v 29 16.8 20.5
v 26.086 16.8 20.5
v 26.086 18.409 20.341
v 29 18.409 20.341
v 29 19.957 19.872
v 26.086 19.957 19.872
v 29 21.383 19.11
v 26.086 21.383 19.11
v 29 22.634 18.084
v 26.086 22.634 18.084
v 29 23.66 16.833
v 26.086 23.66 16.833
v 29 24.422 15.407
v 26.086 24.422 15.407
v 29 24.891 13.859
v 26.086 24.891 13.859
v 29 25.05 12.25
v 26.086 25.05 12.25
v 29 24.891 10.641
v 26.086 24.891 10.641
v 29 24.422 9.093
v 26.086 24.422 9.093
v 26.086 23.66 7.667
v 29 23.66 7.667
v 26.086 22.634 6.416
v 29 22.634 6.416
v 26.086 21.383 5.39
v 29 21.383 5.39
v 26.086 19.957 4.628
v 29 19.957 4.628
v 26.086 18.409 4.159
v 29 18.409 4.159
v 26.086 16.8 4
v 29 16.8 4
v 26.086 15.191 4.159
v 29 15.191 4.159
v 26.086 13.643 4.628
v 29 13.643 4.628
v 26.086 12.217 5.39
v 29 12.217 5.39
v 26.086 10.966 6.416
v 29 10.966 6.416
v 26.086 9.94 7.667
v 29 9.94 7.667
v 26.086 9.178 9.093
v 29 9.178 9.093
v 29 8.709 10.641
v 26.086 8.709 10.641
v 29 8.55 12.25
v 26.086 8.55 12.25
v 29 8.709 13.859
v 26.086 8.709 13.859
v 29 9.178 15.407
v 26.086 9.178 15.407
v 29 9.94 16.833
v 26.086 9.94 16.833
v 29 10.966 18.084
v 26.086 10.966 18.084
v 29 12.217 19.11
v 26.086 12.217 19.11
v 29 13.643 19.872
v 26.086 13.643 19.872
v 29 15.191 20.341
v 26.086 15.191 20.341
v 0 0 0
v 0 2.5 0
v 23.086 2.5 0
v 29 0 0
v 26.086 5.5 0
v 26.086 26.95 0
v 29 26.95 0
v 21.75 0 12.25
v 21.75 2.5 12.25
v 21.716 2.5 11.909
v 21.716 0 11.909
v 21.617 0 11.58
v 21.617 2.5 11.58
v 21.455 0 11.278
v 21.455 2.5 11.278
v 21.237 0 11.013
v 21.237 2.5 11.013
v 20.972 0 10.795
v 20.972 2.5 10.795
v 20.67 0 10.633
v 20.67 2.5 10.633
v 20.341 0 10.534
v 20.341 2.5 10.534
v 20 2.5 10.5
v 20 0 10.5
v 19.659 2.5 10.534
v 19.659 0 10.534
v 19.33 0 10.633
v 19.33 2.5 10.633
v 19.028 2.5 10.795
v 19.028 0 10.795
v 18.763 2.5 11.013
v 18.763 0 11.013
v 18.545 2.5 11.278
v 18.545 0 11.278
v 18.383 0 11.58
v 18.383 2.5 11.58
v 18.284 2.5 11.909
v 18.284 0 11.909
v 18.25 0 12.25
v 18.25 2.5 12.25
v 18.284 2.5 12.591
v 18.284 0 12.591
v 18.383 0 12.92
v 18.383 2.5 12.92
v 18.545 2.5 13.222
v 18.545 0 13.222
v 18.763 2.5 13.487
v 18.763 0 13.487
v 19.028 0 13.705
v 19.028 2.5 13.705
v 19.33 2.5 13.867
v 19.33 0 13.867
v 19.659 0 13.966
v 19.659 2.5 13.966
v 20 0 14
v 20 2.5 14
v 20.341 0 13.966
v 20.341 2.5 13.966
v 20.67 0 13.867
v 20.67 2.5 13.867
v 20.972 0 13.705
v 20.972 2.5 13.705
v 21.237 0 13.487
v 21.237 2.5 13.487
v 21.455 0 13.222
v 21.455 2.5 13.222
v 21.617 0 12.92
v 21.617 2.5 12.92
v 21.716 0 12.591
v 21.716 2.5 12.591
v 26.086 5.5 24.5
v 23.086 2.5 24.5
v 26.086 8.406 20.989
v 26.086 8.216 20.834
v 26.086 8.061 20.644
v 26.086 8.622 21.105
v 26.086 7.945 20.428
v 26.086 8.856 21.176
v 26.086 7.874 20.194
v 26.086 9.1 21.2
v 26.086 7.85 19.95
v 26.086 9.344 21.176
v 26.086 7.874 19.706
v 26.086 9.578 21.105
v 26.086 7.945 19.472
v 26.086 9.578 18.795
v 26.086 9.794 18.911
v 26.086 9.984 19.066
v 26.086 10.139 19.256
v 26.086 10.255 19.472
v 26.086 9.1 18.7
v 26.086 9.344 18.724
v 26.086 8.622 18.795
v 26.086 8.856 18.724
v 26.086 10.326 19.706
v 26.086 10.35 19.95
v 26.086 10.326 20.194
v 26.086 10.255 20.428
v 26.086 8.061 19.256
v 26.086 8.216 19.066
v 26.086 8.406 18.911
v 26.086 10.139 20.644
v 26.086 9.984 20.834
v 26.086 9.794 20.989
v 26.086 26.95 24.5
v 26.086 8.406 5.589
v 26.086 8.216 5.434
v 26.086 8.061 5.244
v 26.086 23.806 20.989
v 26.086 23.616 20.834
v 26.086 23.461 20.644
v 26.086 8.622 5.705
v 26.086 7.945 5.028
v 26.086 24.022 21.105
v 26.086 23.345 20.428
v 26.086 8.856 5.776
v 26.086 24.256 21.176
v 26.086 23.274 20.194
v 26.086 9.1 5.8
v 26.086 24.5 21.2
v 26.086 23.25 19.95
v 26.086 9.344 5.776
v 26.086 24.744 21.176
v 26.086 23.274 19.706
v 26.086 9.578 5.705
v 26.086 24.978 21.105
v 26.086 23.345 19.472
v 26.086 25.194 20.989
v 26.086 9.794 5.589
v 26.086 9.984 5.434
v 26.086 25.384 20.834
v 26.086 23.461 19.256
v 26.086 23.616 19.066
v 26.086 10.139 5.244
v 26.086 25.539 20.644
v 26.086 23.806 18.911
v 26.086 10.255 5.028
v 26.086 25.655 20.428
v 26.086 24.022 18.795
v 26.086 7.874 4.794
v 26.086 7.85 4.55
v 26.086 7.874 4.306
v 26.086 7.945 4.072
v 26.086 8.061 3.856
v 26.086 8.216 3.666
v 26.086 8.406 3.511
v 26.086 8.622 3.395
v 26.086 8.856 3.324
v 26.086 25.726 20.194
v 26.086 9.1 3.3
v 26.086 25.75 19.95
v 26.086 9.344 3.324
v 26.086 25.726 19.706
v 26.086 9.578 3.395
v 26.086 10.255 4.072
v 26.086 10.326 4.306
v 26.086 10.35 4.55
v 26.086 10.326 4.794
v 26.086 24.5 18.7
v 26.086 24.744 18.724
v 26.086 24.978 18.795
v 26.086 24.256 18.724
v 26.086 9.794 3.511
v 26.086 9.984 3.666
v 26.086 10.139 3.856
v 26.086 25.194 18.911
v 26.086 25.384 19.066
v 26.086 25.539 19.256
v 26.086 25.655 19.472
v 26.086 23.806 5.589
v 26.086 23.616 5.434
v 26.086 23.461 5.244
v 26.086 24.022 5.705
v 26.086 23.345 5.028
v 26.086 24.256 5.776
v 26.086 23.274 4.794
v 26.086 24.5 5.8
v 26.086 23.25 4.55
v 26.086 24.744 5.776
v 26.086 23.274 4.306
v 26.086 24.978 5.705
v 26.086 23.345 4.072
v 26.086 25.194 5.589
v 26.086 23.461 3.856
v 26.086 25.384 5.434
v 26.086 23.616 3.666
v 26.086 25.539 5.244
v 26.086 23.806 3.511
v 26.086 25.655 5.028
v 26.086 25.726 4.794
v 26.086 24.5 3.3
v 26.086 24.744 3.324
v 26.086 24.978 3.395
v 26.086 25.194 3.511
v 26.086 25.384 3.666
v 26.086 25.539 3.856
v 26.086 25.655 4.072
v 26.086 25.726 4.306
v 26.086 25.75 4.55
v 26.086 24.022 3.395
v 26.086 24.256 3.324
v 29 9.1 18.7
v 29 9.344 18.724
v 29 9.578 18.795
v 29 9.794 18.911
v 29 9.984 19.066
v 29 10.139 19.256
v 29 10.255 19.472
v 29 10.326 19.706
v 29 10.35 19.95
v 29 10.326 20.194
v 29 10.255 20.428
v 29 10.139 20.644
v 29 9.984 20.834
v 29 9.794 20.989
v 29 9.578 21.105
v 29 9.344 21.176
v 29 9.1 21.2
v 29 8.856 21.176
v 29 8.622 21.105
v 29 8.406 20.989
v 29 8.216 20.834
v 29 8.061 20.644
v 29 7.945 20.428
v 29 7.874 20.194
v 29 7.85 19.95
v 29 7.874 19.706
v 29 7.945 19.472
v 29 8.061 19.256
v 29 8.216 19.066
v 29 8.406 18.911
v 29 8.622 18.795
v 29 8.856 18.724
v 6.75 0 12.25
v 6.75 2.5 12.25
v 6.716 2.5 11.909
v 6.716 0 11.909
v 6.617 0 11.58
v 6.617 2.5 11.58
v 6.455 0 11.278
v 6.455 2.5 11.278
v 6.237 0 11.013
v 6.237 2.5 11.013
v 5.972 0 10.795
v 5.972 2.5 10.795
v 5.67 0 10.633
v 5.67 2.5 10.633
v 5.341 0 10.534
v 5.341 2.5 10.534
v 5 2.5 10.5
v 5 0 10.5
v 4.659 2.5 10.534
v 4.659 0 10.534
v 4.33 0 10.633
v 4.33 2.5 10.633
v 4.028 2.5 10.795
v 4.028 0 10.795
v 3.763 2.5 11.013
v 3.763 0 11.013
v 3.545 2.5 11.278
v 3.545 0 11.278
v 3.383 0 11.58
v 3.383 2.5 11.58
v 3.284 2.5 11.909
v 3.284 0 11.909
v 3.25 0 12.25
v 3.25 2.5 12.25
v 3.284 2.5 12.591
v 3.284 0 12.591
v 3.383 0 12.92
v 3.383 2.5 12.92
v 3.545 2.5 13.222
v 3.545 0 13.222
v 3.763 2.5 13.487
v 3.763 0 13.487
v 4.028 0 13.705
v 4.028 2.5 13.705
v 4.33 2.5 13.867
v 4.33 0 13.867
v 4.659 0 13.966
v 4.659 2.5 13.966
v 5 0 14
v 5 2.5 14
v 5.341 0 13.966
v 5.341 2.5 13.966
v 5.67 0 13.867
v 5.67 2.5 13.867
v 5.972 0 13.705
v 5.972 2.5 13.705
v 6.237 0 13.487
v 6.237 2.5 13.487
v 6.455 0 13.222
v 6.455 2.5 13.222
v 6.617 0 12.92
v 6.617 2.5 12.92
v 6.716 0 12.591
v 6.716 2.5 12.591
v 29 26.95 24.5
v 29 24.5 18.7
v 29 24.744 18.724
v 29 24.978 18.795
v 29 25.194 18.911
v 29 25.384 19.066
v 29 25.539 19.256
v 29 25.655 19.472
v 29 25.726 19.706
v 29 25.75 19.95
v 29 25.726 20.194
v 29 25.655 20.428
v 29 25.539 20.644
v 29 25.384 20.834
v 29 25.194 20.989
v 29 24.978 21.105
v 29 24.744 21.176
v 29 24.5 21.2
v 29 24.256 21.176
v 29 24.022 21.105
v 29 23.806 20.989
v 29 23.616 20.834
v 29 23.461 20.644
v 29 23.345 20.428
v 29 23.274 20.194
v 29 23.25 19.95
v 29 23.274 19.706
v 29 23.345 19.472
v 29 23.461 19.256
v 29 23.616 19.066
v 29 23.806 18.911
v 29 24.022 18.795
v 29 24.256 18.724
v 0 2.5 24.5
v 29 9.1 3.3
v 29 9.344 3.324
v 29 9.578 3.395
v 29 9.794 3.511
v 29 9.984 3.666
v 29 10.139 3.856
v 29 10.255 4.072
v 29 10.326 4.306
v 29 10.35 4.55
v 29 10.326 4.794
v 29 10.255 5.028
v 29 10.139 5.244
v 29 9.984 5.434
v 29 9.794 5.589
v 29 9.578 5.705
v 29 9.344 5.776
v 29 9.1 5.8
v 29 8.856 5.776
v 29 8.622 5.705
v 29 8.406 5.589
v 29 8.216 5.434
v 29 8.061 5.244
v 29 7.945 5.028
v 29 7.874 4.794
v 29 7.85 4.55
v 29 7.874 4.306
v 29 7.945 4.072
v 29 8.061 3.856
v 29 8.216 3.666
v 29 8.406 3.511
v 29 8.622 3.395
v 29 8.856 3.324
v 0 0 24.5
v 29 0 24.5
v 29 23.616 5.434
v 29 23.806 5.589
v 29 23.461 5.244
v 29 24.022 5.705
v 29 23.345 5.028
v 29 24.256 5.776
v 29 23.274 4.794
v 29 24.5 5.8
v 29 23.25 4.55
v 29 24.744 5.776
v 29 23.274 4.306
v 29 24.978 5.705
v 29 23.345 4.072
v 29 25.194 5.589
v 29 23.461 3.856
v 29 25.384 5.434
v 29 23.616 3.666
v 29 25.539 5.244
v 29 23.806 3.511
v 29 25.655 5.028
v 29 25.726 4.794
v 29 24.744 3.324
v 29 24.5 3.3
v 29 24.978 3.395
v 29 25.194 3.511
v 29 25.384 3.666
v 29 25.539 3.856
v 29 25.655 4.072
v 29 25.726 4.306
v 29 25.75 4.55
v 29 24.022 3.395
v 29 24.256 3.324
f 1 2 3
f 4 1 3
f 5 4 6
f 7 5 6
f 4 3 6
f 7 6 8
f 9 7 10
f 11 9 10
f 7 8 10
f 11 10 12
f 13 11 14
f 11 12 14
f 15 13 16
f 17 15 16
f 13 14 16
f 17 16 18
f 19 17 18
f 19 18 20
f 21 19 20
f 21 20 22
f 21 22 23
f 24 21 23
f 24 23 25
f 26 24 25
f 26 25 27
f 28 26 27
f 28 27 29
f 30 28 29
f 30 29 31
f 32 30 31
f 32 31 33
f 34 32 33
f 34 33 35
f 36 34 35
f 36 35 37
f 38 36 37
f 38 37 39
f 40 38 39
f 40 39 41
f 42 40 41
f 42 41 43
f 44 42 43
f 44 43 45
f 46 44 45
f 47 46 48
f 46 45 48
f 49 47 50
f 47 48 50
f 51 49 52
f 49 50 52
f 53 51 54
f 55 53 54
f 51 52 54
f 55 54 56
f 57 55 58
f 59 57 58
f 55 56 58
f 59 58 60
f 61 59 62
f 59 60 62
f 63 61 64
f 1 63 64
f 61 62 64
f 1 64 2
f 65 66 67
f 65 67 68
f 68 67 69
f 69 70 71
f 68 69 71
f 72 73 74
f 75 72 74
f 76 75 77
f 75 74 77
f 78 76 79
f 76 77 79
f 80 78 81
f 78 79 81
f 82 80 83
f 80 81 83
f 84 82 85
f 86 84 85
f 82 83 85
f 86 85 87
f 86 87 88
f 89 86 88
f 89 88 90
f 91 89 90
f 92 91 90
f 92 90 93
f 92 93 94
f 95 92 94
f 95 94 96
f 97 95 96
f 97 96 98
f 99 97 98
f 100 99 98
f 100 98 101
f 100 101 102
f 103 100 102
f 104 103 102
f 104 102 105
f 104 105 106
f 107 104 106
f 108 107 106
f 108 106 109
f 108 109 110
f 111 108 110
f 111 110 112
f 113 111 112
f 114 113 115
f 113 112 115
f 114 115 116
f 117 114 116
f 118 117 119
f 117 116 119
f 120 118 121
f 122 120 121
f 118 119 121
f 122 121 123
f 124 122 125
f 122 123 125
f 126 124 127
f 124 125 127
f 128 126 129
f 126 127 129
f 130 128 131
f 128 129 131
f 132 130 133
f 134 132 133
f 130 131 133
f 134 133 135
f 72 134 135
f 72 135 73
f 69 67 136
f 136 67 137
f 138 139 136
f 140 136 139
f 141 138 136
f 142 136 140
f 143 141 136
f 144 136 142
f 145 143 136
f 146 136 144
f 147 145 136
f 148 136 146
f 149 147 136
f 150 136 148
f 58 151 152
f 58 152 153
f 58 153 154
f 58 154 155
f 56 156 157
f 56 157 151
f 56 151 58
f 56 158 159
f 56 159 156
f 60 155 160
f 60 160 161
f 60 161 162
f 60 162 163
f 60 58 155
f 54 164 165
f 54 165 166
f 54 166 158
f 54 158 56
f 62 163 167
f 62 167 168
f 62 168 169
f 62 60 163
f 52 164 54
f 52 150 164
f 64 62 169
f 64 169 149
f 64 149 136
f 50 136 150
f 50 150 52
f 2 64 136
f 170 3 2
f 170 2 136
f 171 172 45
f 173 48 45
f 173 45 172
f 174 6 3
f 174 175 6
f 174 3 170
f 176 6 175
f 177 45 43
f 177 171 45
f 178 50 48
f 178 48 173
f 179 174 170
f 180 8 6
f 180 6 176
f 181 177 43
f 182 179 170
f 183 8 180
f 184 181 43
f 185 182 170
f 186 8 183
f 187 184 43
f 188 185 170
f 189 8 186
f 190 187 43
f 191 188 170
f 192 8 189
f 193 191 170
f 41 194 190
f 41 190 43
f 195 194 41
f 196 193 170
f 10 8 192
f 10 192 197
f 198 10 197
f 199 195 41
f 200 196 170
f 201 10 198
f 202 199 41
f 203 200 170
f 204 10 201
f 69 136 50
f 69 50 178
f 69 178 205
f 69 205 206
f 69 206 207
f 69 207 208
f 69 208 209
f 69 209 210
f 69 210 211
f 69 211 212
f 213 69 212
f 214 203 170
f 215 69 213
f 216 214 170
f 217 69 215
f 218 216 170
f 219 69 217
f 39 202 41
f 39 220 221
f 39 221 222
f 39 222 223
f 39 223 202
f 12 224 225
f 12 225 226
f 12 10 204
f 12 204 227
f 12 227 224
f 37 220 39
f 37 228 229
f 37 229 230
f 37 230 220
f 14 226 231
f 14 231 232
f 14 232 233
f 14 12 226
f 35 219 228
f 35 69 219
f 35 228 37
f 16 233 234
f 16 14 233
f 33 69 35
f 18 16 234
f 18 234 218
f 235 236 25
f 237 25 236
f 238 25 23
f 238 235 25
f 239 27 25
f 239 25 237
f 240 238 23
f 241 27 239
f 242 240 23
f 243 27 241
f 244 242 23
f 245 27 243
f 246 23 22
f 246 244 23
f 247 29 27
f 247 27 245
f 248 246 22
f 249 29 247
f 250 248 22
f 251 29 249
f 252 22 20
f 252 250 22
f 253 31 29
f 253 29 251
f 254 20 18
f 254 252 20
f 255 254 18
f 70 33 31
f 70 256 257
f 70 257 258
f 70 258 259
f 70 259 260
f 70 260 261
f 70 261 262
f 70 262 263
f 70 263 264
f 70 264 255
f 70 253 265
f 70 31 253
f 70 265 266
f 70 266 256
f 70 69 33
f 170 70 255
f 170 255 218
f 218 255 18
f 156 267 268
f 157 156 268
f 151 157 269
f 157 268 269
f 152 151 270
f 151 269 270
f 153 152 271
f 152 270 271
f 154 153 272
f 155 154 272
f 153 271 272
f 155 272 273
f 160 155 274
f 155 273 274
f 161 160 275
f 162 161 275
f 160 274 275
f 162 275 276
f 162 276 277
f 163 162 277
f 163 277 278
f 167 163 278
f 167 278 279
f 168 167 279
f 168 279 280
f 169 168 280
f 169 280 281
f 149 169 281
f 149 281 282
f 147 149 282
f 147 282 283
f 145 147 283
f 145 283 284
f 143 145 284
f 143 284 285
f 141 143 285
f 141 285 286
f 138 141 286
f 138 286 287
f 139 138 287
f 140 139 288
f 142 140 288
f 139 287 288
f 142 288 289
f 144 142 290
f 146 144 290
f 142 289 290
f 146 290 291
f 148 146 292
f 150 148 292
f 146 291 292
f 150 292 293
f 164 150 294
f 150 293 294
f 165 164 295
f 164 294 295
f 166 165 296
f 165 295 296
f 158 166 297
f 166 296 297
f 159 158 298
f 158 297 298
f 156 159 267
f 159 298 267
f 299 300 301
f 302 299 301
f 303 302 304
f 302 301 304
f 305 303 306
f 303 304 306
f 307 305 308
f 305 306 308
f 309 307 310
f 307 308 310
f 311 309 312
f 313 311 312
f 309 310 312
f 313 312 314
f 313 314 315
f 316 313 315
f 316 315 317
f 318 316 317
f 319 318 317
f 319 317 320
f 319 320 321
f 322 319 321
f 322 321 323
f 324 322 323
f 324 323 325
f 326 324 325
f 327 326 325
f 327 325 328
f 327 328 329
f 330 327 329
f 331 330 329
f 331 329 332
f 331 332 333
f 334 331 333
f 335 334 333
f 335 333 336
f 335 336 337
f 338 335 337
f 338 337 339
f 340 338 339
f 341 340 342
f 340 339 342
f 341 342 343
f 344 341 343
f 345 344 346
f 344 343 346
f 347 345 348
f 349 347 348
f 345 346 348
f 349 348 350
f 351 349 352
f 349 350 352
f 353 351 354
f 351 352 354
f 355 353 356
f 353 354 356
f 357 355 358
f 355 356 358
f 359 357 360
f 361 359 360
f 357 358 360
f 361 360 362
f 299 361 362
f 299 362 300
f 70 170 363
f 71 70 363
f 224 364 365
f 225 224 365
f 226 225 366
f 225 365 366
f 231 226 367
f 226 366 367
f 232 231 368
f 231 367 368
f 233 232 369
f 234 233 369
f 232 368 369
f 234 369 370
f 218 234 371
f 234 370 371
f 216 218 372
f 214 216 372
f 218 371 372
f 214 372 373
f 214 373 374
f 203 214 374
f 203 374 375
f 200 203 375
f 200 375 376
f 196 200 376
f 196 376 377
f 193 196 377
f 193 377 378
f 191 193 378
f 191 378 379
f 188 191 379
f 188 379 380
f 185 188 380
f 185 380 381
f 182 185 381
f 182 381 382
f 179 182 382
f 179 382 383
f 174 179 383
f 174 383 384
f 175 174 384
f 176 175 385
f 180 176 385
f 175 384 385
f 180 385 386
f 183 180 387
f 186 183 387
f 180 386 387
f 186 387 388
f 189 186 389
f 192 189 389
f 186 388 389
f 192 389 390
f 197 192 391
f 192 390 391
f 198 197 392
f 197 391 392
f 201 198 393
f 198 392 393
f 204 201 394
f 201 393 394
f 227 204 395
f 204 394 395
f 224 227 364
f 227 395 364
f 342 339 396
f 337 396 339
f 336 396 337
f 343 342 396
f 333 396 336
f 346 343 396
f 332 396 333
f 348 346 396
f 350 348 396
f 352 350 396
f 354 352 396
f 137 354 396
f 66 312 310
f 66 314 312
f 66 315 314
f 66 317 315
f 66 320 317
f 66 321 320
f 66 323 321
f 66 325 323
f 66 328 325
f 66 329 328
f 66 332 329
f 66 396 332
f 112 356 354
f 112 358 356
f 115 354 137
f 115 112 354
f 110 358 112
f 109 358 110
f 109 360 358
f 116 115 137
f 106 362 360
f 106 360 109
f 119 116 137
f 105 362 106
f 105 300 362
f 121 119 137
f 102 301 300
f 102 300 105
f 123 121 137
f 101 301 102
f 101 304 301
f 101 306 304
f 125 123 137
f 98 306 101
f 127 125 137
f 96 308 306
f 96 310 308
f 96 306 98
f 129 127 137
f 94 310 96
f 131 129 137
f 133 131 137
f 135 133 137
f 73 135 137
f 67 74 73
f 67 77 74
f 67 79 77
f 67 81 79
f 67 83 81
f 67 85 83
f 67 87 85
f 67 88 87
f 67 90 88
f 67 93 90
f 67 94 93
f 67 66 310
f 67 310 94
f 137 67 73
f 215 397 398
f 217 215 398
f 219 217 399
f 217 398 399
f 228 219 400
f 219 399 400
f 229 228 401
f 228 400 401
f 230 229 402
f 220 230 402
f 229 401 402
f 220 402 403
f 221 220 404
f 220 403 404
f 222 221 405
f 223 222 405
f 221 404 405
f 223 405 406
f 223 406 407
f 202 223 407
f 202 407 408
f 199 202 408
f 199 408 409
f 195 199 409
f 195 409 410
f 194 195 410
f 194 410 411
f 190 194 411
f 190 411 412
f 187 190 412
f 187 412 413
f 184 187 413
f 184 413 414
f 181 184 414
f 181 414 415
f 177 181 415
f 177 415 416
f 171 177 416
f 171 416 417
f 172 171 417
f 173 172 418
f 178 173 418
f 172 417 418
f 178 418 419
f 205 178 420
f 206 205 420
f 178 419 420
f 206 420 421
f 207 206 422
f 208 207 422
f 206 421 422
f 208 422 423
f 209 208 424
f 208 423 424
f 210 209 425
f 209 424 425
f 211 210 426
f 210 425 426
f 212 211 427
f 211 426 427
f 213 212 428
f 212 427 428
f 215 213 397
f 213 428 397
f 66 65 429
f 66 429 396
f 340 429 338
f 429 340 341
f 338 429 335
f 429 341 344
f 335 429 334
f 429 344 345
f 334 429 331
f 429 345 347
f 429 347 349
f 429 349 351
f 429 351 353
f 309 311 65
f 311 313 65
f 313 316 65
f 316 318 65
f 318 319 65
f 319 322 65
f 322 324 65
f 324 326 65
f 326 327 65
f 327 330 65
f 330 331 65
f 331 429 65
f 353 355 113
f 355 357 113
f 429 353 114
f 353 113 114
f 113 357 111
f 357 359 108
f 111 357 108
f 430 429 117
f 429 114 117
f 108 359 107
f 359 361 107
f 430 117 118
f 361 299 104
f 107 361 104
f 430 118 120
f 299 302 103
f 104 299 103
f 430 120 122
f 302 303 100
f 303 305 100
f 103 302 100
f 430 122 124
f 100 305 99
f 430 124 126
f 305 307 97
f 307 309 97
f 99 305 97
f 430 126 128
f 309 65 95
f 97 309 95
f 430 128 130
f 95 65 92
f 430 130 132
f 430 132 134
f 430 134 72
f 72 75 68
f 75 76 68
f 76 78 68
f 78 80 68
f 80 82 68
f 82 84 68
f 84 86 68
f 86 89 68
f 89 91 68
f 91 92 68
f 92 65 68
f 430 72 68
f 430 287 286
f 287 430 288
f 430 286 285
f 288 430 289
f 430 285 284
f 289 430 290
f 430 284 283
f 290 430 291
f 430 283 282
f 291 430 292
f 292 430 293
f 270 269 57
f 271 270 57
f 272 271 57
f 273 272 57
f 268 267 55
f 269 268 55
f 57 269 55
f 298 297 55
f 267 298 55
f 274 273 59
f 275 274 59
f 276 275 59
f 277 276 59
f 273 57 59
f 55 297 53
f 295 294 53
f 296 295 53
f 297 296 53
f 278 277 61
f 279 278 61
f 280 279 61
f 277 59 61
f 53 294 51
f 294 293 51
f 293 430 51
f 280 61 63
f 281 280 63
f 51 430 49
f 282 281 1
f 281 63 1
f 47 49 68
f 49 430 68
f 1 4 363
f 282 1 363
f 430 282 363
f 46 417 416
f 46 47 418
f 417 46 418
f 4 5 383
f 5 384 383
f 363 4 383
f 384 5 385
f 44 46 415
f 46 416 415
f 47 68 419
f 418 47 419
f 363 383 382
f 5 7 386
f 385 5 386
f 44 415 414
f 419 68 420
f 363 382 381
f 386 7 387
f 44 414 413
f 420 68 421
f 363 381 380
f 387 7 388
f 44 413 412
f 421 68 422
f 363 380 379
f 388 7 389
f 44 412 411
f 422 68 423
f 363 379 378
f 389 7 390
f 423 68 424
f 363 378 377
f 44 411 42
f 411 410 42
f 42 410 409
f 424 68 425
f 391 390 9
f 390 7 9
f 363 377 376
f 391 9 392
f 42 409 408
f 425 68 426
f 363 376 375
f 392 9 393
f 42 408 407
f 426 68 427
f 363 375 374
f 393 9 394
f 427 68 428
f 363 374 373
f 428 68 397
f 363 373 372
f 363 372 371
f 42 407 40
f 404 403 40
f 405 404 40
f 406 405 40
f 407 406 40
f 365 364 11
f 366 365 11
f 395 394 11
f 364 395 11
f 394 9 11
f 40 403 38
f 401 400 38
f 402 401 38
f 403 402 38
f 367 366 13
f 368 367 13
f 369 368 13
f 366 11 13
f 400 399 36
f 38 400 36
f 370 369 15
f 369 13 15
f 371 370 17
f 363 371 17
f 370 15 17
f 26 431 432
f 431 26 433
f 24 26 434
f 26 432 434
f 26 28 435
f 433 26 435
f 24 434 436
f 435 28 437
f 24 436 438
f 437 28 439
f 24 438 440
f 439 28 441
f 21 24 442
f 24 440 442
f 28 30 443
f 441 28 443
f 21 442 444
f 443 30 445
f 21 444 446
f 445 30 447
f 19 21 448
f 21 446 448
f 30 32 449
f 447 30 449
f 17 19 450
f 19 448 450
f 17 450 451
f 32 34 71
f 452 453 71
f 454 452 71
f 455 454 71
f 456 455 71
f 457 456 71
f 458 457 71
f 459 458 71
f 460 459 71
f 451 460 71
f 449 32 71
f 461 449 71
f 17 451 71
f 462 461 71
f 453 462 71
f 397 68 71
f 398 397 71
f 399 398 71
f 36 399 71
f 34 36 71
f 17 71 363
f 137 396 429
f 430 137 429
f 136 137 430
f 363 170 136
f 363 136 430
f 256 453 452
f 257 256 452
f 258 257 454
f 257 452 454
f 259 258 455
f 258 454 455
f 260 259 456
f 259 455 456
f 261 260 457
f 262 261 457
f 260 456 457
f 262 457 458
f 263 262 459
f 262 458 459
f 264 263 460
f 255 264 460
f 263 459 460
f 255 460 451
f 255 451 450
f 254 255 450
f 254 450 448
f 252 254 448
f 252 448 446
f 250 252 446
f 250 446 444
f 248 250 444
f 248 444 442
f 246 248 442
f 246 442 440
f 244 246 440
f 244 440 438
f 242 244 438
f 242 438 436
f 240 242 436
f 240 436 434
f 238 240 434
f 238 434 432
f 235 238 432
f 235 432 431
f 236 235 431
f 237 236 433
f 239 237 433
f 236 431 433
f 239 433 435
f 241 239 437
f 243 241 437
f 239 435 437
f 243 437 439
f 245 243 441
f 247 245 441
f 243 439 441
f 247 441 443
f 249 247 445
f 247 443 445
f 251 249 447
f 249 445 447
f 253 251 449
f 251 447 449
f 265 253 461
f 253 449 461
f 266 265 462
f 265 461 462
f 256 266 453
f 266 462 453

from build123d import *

# Parameters (mm, degrees)
SKETCH1_W               = 2.914347554
SKETCH1_H               = 25
SKETCH1_W_2             = 29
SKETCH1_H_2             = 2.5
BOSS_EXTRUDE1_DEPTH     = 24.5
SKETCH2_R               = 1.25
CUT_EXTRUDE1_DEPTH      = 30
SKETCH3_R               = 1.75
CUT_EXTRUDE2_DEPTH      = 26
CUT_EXTRUDE2_DEPTH_BACK = 3.5
SKETCH4_R               = 8.25
CUT_EXTRUDE3_DEPTH      = 27.085652446
CUT_EXTRUDE3_DEPTH_BACK = 3.914347554
SKETCH5_W               = 2.914347554
SKETCH5_H               = 0.55
CUT_EXTRUDE4_DEPTH      = 1
CUT_EXTRUDE4_DEPTH_BACK = 25.5
CHAMFER1_SIZE           = 3


with BuildPart() as part:
    # Sketch1 → Boss-Extrude1 (new body)
    with BuildSketch(Plane.XY):
        with Locations((27.542826223, 15)):
            Rectangle(SKETCH1_W, SKETCH1_H)
        with Locations((14.5, 1.25)):
            Rectangle(SKETCH1_W_2, SKETCH1_H_2)
    extrude(amount=BOSS_EXTRUDE1_DEPTH)

    # Sketch2 → Cut-Extrude1 (cut, through all)
    with BuildSketch(Plane(origin=(29, 0, 0), x_dir=(0, 0, -1), z_dir=(1, 0, 0))):
        with Locations((-19.95, 24.5)):
            Circle(SKETCH2_R)
        with Locations((-4.55, 24.5)):
            Circle(SKETCH2_R)
        with Locations((-4.55, 9.1)):
            Circle(SKETCH2_R)
        with Locations((-19.95, 9.1)):
            Circle(SKETCH2_R)
    extrude(amount=-CUT_EXTRUDE1_DEPTH, mode=Mode.SUBTRACT)

    # Sketch3 → Cut-Extrude2 (cut, two sides)
    with BuildSketch(Plane(origin=(0, 2.5, 0), x_dir=(1, 0, 0), z_dir=(0, 1, 0))) as cut_extrude2_sk:
        with Locations((5, -12.25)):
            Circle(SKETCH3_R)
        with Locations((20, -12.25)):
            Circle(SKETCH3_R)
    extrude(amount=CUT_EXTRUDE2_DEPTH, mode=Mode.SUBTRACT)
    extrude(cut_extrude2_sk.sketch, amount=-CUT_EXTRUDE2_DEPTH_BACK, mode=Mode.SUBTRACT)

    # Sketch4 → Cut-Extrude3 (cut, two sides)
    with BuildSketch(Plane.ZY.offset(-26.085652446)) as cut_extrude3_sk:
        with Locations((12.25, 16.8)):
            Circle(SKETCH4_R)
    extrude(amount=CUT_EXTRUDE3_DEPTH, mode=Mode.SUBTRACT)
    extrude(cut_extrude3_sk.sketch, amount=-CUT_EXTRUDE3_DEPTH_BACK, mode=Mode.SUBTRACT)

    # Sketch5 → Cut-Extrude4 (cut, two sides)
    with BuildSketch(Plane.XY.offset(24.5)) as cut_extrude4_sk:
        with Locations((27.542826223, 27.225)):
            Rectangle(SKETCH5_W, SKETCH5_H)
    extrude(amount=CUT_EXTRUDE4_DEPTH, mode=Mode.SUBTRACT)
    extrude(cut_extrude4_sk.sketch, amount=-CUT_EXTRUDE4_DEPTH_BACK, mode=Mode.SUBTRACT)

    # Chamfer1
    chamfer1_edges = [part.edges().sort_by_distance(p)[0] for p in [
        (26.085652446, 2.5, 12.25),
    ]]
    chamfer(chamfer1_edges, length=CHAMFER1_SIZE)


solid = part.part
